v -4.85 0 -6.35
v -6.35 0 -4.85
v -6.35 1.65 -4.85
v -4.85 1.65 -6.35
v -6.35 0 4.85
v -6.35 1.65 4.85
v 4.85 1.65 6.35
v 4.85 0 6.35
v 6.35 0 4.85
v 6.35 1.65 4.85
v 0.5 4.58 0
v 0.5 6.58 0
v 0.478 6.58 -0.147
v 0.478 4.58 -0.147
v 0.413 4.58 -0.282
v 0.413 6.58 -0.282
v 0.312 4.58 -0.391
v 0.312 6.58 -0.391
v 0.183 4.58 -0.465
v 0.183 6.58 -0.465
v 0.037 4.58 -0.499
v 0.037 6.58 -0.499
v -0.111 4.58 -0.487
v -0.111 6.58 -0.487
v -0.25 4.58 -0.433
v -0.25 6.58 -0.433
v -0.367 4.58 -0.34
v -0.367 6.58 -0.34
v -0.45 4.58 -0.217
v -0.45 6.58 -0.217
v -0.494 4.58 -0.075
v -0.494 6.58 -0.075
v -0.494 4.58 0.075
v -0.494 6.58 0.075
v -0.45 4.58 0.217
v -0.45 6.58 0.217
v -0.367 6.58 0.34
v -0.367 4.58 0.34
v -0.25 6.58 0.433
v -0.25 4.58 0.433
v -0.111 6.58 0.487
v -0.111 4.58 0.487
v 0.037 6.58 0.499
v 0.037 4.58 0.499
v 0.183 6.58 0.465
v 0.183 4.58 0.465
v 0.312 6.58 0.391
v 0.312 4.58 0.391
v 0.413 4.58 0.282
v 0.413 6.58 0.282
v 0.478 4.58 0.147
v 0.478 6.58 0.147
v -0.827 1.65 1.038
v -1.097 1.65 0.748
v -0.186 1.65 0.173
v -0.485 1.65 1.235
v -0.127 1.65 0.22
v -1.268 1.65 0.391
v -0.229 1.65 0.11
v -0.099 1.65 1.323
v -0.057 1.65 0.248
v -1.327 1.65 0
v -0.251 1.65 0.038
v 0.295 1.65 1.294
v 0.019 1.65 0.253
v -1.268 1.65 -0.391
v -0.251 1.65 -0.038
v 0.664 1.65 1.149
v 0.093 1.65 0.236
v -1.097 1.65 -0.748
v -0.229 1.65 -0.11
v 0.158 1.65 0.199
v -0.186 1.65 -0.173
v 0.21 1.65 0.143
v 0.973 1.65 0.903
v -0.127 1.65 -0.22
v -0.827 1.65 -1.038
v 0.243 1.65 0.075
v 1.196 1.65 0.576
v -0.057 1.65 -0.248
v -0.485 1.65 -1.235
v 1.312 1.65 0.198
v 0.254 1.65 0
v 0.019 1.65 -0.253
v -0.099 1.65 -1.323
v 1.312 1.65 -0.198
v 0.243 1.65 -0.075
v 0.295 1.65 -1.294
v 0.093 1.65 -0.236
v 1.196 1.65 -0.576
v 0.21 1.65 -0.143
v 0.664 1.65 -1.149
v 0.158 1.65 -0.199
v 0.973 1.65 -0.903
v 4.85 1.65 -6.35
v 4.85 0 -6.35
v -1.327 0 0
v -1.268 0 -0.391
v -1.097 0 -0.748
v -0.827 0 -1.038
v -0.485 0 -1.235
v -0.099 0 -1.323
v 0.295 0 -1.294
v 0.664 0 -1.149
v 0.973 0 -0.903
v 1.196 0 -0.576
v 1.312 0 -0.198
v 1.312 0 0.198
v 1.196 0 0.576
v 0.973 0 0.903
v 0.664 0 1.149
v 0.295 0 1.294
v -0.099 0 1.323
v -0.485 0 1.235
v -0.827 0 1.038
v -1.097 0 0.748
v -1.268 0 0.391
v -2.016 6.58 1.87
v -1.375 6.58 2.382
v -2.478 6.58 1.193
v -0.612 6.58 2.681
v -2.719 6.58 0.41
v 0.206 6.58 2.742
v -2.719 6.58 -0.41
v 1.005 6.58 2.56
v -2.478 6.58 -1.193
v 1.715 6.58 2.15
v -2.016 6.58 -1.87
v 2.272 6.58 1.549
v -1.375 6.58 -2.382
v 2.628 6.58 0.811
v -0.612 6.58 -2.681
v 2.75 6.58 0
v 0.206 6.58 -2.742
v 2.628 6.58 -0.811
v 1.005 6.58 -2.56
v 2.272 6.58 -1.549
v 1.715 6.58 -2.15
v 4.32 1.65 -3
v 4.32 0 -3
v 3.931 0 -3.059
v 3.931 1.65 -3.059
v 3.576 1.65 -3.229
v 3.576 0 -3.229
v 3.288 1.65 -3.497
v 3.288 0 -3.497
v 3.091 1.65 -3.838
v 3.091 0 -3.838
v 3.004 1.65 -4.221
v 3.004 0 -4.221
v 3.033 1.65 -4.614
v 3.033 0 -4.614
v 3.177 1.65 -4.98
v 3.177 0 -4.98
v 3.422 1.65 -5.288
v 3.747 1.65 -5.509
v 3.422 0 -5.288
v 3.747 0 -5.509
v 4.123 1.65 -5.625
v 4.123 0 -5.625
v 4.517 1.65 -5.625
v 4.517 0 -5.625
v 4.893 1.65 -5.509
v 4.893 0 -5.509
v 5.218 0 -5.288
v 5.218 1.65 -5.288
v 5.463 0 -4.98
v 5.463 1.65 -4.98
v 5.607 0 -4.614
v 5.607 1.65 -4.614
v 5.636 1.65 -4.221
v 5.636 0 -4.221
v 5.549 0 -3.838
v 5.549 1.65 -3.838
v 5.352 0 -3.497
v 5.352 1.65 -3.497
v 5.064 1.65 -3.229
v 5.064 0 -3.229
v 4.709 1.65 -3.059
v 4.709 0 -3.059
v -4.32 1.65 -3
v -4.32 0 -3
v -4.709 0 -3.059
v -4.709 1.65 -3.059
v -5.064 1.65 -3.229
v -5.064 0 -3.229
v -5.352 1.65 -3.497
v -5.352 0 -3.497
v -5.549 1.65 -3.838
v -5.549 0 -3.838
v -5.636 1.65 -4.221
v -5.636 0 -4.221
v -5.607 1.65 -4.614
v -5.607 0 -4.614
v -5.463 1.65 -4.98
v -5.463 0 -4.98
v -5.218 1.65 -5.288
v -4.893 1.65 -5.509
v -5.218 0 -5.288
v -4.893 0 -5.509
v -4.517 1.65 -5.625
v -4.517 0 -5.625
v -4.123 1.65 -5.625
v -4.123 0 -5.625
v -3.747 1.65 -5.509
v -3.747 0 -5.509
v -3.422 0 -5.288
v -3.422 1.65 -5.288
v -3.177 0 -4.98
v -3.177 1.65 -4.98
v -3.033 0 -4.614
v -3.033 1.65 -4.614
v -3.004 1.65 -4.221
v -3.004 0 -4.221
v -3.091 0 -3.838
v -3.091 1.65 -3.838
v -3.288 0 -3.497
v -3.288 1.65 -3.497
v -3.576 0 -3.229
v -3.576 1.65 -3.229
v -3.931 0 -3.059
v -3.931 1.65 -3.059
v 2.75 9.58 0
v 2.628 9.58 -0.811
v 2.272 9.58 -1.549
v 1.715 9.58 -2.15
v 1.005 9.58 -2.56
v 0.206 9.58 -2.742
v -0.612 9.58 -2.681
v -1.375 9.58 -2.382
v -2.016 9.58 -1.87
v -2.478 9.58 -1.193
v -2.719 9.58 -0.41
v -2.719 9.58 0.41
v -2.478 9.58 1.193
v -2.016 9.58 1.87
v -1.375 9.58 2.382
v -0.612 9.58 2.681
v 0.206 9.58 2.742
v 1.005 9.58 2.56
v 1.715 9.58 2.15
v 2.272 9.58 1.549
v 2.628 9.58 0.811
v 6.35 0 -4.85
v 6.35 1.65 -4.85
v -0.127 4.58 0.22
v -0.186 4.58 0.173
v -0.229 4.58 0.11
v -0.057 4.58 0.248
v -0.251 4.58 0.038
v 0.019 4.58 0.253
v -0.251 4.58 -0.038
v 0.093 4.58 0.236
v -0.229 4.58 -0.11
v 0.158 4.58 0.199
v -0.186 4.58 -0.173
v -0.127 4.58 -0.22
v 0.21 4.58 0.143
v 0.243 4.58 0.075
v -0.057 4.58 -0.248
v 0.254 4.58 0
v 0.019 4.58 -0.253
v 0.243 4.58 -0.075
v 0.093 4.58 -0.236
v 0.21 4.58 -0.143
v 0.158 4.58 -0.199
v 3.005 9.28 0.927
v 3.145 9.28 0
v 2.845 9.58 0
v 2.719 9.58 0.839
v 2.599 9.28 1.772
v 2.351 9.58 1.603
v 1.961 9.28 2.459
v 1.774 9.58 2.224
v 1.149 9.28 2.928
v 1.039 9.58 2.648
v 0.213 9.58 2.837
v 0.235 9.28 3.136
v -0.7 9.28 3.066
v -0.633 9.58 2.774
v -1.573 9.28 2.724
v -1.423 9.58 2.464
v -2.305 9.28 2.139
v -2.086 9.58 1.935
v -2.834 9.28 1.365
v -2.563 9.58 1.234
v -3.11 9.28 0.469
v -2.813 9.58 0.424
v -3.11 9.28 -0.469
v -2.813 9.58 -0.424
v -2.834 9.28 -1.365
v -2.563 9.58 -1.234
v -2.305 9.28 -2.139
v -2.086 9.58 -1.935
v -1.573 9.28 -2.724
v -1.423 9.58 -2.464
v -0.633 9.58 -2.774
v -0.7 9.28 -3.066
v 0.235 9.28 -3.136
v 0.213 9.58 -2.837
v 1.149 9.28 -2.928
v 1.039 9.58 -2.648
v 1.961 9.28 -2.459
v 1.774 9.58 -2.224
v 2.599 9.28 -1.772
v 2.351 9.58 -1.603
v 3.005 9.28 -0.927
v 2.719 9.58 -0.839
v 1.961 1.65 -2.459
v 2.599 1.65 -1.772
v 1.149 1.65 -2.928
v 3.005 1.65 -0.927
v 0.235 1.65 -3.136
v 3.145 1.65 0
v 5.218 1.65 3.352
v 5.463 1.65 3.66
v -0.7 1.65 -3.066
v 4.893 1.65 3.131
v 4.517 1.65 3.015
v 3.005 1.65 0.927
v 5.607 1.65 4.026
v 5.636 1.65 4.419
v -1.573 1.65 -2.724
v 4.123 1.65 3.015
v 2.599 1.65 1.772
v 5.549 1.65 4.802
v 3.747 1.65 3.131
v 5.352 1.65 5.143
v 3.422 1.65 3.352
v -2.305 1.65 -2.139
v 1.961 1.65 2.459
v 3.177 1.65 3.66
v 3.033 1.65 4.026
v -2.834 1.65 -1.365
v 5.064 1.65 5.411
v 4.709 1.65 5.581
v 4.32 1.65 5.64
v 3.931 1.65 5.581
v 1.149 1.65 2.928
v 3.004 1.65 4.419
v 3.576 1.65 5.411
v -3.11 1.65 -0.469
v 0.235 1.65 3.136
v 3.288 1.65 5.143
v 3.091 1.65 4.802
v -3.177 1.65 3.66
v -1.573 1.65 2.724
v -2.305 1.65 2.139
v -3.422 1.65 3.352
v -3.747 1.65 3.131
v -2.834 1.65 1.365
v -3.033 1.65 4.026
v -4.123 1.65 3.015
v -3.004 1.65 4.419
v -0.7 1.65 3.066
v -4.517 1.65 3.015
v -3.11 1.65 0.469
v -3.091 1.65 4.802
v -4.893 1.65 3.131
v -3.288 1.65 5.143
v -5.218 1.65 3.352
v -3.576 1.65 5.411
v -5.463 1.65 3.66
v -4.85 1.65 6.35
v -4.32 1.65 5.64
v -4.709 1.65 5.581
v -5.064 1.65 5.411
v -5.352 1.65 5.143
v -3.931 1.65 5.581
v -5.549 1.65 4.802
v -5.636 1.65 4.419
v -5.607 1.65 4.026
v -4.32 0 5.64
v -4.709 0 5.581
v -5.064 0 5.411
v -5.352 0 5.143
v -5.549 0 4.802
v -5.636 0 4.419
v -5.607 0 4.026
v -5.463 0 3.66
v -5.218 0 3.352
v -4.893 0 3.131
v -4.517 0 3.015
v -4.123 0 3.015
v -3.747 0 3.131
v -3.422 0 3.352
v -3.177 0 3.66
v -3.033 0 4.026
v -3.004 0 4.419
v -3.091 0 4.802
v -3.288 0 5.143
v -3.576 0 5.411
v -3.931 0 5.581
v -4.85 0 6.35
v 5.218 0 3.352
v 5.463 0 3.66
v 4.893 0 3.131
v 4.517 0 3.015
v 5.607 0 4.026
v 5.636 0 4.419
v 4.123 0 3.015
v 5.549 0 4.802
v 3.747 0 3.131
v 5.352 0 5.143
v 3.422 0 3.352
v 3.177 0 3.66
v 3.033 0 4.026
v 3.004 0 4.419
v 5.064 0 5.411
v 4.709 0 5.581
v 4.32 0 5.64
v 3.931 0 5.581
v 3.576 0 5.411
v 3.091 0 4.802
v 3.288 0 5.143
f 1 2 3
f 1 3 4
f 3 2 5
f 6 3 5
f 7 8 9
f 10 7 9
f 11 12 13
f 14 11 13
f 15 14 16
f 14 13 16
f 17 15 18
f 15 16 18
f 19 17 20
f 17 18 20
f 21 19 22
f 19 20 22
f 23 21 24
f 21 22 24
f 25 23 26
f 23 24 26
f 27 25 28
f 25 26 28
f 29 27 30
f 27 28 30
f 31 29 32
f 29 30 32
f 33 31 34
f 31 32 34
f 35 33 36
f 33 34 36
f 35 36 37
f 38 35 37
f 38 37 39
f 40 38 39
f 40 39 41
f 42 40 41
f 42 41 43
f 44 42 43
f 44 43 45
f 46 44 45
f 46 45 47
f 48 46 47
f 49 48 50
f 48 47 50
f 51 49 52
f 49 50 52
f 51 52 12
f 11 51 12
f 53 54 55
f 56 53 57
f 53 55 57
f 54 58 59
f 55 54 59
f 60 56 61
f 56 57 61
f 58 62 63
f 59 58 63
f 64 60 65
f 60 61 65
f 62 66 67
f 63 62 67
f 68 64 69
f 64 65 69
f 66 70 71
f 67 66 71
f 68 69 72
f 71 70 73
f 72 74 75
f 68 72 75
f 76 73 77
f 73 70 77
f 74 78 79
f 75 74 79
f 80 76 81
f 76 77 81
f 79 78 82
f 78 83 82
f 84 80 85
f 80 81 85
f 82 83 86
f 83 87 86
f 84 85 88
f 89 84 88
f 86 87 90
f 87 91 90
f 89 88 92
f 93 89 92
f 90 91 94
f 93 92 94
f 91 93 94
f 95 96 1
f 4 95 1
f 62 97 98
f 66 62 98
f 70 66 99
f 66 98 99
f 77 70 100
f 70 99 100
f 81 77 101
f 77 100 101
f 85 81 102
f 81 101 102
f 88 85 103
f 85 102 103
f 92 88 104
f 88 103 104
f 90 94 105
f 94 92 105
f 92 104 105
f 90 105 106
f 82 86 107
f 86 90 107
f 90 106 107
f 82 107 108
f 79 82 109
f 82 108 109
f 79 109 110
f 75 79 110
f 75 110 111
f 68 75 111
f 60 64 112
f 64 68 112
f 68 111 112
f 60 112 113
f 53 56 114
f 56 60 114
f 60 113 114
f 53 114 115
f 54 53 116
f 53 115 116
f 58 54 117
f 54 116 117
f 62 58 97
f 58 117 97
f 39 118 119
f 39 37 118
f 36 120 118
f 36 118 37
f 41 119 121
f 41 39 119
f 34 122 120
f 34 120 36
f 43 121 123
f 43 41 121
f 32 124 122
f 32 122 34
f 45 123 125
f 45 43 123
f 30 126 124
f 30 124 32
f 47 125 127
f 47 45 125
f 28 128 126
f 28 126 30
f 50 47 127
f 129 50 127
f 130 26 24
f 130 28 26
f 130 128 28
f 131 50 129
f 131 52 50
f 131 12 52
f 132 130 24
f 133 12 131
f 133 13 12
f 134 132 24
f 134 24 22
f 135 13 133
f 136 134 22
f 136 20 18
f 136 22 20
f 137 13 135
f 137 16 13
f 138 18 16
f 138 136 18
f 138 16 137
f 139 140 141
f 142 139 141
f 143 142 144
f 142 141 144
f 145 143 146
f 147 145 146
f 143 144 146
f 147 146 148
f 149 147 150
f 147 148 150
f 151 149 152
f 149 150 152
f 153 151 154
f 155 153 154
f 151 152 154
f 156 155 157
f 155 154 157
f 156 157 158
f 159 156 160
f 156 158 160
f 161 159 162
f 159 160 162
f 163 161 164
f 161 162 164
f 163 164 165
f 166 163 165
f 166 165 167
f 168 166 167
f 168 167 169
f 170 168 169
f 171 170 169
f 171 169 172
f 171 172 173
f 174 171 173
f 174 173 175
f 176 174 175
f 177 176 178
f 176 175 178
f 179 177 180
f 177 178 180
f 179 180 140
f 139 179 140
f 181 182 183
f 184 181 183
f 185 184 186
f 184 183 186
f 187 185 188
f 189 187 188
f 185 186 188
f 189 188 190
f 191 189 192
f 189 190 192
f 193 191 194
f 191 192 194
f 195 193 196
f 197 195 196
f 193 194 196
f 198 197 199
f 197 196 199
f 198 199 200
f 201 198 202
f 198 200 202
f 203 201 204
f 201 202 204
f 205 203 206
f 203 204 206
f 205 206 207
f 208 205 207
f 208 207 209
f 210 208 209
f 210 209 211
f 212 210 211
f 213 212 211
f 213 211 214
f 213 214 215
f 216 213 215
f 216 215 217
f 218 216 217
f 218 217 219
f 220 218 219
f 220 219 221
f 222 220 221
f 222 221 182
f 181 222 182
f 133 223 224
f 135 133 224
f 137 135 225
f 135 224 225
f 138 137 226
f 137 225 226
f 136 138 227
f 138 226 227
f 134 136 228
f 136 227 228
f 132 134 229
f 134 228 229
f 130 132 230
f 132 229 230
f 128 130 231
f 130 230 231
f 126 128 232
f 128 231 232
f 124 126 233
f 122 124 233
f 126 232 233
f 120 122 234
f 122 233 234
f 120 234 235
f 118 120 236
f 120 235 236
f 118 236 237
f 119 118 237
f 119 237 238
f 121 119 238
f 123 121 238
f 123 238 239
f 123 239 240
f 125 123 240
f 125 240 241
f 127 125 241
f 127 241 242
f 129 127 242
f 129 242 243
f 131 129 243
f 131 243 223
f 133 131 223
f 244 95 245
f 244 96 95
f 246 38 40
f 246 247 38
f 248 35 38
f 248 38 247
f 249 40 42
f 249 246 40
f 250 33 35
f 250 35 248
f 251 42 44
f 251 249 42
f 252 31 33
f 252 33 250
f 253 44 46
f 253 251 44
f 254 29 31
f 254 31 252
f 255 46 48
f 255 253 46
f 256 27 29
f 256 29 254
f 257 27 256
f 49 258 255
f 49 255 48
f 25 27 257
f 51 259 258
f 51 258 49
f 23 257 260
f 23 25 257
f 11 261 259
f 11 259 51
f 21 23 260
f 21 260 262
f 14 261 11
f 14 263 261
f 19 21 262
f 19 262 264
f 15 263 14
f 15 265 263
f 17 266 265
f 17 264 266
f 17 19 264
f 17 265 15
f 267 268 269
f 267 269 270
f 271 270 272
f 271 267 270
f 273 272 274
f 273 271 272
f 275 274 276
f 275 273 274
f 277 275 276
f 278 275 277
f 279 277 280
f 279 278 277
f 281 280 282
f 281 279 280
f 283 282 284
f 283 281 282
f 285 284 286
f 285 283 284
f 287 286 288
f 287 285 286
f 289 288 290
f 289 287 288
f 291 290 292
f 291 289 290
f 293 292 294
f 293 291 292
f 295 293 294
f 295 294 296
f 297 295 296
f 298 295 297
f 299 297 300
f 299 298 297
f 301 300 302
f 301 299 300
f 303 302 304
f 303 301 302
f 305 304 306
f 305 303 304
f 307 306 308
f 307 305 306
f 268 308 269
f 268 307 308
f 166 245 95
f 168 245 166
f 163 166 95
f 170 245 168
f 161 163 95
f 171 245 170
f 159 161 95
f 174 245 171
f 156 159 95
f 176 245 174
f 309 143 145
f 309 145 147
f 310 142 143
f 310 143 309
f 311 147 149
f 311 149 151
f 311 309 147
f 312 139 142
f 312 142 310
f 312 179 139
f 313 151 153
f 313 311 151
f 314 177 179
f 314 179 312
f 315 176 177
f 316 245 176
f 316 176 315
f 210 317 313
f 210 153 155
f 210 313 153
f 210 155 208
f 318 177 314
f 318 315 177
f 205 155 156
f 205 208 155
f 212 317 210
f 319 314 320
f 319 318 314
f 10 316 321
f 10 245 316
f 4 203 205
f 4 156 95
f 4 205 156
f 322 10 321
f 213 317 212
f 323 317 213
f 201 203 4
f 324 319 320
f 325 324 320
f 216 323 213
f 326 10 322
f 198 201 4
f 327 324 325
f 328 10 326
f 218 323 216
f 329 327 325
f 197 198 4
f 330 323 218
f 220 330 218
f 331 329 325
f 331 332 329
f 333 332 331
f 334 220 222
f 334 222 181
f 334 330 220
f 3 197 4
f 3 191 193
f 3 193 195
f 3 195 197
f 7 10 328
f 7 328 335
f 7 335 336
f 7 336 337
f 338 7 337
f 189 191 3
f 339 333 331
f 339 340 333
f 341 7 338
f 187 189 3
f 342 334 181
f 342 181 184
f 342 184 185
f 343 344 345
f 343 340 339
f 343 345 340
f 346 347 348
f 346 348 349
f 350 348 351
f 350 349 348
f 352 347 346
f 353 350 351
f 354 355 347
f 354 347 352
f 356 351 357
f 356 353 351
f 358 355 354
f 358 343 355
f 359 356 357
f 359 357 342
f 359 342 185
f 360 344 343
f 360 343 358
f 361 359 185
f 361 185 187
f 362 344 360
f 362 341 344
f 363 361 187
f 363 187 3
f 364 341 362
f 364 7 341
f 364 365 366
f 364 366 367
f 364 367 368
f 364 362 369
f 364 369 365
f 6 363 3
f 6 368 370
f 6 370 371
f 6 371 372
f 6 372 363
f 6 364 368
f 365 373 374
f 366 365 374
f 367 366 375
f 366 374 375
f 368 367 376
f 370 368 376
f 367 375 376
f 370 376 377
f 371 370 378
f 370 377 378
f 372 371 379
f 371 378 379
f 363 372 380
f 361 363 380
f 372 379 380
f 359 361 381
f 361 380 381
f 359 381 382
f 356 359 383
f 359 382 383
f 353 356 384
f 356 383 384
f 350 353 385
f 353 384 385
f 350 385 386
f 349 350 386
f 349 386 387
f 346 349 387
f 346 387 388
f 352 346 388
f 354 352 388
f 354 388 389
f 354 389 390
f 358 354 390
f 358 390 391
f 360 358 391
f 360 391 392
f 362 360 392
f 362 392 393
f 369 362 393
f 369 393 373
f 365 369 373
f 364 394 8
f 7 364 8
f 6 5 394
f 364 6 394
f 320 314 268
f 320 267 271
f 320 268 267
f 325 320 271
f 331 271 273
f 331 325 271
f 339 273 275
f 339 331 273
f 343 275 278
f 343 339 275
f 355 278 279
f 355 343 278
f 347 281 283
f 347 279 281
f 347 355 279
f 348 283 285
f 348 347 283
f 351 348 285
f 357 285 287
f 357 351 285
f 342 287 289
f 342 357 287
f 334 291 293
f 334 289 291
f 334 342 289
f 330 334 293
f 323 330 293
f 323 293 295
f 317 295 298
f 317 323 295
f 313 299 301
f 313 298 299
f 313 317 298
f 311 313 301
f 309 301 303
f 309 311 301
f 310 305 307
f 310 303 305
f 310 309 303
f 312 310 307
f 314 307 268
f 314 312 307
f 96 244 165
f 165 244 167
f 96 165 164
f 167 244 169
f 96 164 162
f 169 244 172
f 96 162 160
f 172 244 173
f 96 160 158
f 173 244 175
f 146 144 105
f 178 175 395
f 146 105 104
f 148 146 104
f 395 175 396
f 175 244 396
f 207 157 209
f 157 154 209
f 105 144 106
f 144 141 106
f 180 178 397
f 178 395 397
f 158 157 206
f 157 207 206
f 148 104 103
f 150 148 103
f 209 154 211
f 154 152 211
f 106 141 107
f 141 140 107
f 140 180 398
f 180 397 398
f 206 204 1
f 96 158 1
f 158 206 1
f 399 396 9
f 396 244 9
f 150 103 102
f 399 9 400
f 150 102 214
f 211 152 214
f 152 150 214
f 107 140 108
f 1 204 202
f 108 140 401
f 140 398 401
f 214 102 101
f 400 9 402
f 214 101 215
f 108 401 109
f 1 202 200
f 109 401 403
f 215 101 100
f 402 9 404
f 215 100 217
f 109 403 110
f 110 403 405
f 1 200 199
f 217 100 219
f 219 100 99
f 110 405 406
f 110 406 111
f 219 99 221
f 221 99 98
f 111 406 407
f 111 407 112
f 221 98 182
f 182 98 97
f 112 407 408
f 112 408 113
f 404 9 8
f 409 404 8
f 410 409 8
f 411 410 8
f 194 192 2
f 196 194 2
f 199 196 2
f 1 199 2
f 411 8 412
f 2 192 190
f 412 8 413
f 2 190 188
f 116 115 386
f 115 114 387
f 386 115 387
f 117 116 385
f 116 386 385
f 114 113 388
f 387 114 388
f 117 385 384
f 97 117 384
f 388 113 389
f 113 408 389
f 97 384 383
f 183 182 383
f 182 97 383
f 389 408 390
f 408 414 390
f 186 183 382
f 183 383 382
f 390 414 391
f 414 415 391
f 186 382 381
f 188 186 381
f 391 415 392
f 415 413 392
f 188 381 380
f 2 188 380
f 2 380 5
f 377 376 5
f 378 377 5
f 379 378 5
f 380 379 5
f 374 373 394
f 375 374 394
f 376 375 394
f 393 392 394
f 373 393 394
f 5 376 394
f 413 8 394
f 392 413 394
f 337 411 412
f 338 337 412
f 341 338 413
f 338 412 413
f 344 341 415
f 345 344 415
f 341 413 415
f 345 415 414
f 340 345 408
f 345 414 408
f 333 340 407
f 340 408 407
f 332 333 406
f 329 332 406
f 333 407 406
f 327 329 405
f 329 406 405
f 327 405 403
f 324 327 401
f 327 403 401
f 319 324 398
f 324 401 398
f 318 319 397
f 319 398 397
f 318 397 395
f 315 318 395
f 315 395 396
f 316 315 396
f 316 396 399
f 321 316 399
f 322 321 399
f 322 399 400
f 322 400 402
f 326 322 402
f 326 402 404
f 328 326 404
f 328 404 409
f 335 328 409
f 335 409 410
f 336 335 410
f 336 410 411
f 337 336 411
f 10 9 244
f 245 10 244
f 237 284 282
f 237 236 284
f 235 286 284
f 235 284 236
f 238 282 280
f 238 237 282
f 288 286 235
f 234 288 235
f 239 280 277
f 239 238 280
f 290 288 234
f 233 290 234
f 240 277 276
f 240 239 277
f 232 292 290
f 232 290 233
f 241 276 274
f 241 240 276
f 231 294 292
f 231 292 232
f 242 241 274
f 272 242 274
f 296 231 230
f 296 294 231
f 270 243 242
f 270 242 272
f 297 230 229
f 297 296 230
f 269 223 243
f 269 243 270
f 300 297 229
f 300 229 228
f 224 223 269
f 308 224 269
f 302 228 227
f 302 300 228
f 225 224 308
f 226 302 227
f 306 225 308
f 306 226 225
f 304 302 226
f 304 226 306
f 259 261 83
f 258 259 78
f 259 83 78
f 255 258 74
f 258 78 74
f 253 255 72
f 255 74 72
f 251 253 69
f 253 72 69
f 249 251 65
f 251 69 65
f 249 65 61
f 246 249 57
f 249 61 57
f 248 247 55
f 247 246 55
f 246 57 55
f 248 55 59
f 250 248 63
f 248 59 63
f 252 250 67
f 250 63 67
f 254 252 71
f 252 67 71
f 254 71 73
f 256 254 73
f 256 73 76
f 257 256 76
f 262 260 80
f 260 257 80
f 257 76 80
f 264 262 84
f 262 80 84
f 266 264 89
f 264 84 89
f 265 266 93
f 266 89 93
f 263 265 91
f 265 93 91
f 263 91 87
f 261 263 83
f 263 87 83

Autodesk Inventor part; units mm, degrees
ref_plane "YZ Plane" through (0, 0, 0) normal (1, 0, 0) x (0, 1, 0)
ref_plane "XZ Plane" through (0, 0, 0) normal (0, 1, 0) x (-1, 0, 0)
ref_plane "XY Plane" through (0, 0, 0) normal (0, 0, 1) x (1, 0, 0)
sketch "Sketch1" plane through (0, 0, 0) normal (0, 1, 0) x (-1, 0, 0)
  line L0 (4.85, 6.35) -> (-4.85, 6.35)
  line L1 (-6.35, 4.85) -> (-6.35, -4.85)
  line L2 (-4.85, -6.35) -> (4.85, -6.35)
  line L3 (6.35, -4.85) -> (6.35, 4.85)
  line L4 (6.35, 6.35) -> (-6.35, -6.35) construction
  line L5 (-6.35, 6.35) -> (6.35, -6.35) construction
  line L6 (6.35, -4.85) -> (4.85, -6.35)
  line L7 (-4.85, -6.35) -> (-6.35, -4.85)
  line L8 (-4.85, 6.35) -> (-6.35, 4.85)
  line L9 (6.35, 4.85) -> (4.85, 6.35)
  line L10 (4.32, 4.32) -> (-4.32, 4.32) construction
  line L11 (-4.32, 4.32) -> (-4.32, -4.32) construction
  line L12 (-4.32, -4.32) -> (4.32, -4.32) construction
  line L13 (4.32, -4.32) -> (4.32, 4.32) construction
  line L14 (4.32, 4.32) -> (-4.32, -4.32) construction
  line L15 (-4.32, 4.32) -> (4.32, -4.32) construction
  circle A0 centre (0, 0) radius 1.3272
  dimension "d0" = 12.7
  dimension "d1" = 12.7
  dimension "d5" = 9.7
  dimension "d6" = 1.5
  dimension "d7" = 8.64
  dimension "d8" = 8.64
  dimension "d9" = 2.6543
extrude "Extrusion1" add sketch "Sketch1" along normal blind 1.65
sketch "Sketch2" plane through (0, 1.65, 0) normal (0, 1, 0) x (1, 0, 0)
  circle A0 centre (0, 0) radius 1.3272 projected
  line L0 (-4.32, -4.32) -> (4.32, -4.32) construction
  line L1 (4.32, -4.32) -> (4.32, 4.32) construction
  line L2 (4.32, 4.32) -> (-4.32, 4.32) construction
  line L3 (-4.32, 4.32) -> (-4.32, -4.32) construction
  line L4 (-4.32, -4.32) -> (4.32, 4.32) construction
  line L5 (4.32, -4.32) -> (-4.32, 4.32) construction
  dimension "d12" = 8.64
  dimension "d13" = 8.64
hole "Hole1" at (-4.32, 1.65, -4.32) at (4.32, 1.65, -4.32) at (4.32, 1.65, 4.32) at (-4.32, 1.65, 4.32) direction (0, -1, 0) diameter 2.64 depth 1.65 tip angle 118
sketch "Sketch3" plane through (0, 1.65, 0) normal (0, 1, 0) x (1, 0, 0)
  circle A0 centre (0, 0) radius 1.3272 projected
  circle A1 centre (0, 0) radius 3.145
  dimension "d21" = 6.29
extrude "Extrusion2" add sketch "Sketch3" along normal blind 7.93 contours A0 | A1
thread "Thread1" size "1/4-36 UNS" class "2A" standard "ANSI Unified Screw Threads" length 4.38
chamfer "Chamfer1" distance 0.3 angle 45 1 edges at (-3.145, 9.58, 0)
sketch "Sketch4" plane through (0, 9.58, 0) normal (0, 1, 0) x (1, 0, 0)
  circle A0 centre (0, 0) radius 2.845 projected
  circle A1 centre (0, 0) radius 2.75
  dimension "d30" = 5.5
extrude "Extrusion3" cut sketch "Sketch4" against normal blind 3 contours A1
sketch "Sketch5" plane through (0, 1.65, 0) normal (0, -1, 0) x (1, 0, 0)
  circle A0 centre (0, 0) radius 1.3272 projected
  circle A1 centre (0, 0) radius 0.254
  dimension "d33" = 0.508
extrude "Extrusion4" cut sketch "Sketch5" against normal blind 6 contours A1
sketch "Sketch6" plane through (0, 6.58, 0) normal (0, 1, 0) x (1, 0, 0)
  circle A0 centre (0, 0) radius 0.254 projected
  circle A1 centre (0, 0) radius 2.75 projected
  circle A2 centre (0, 0) radius 0.5
  dimension "d36" = 1
extrude "Extrusion5" cut sketch "Sketch6" against normal blind 2 contours A2
properties part number "SMA_connector"
